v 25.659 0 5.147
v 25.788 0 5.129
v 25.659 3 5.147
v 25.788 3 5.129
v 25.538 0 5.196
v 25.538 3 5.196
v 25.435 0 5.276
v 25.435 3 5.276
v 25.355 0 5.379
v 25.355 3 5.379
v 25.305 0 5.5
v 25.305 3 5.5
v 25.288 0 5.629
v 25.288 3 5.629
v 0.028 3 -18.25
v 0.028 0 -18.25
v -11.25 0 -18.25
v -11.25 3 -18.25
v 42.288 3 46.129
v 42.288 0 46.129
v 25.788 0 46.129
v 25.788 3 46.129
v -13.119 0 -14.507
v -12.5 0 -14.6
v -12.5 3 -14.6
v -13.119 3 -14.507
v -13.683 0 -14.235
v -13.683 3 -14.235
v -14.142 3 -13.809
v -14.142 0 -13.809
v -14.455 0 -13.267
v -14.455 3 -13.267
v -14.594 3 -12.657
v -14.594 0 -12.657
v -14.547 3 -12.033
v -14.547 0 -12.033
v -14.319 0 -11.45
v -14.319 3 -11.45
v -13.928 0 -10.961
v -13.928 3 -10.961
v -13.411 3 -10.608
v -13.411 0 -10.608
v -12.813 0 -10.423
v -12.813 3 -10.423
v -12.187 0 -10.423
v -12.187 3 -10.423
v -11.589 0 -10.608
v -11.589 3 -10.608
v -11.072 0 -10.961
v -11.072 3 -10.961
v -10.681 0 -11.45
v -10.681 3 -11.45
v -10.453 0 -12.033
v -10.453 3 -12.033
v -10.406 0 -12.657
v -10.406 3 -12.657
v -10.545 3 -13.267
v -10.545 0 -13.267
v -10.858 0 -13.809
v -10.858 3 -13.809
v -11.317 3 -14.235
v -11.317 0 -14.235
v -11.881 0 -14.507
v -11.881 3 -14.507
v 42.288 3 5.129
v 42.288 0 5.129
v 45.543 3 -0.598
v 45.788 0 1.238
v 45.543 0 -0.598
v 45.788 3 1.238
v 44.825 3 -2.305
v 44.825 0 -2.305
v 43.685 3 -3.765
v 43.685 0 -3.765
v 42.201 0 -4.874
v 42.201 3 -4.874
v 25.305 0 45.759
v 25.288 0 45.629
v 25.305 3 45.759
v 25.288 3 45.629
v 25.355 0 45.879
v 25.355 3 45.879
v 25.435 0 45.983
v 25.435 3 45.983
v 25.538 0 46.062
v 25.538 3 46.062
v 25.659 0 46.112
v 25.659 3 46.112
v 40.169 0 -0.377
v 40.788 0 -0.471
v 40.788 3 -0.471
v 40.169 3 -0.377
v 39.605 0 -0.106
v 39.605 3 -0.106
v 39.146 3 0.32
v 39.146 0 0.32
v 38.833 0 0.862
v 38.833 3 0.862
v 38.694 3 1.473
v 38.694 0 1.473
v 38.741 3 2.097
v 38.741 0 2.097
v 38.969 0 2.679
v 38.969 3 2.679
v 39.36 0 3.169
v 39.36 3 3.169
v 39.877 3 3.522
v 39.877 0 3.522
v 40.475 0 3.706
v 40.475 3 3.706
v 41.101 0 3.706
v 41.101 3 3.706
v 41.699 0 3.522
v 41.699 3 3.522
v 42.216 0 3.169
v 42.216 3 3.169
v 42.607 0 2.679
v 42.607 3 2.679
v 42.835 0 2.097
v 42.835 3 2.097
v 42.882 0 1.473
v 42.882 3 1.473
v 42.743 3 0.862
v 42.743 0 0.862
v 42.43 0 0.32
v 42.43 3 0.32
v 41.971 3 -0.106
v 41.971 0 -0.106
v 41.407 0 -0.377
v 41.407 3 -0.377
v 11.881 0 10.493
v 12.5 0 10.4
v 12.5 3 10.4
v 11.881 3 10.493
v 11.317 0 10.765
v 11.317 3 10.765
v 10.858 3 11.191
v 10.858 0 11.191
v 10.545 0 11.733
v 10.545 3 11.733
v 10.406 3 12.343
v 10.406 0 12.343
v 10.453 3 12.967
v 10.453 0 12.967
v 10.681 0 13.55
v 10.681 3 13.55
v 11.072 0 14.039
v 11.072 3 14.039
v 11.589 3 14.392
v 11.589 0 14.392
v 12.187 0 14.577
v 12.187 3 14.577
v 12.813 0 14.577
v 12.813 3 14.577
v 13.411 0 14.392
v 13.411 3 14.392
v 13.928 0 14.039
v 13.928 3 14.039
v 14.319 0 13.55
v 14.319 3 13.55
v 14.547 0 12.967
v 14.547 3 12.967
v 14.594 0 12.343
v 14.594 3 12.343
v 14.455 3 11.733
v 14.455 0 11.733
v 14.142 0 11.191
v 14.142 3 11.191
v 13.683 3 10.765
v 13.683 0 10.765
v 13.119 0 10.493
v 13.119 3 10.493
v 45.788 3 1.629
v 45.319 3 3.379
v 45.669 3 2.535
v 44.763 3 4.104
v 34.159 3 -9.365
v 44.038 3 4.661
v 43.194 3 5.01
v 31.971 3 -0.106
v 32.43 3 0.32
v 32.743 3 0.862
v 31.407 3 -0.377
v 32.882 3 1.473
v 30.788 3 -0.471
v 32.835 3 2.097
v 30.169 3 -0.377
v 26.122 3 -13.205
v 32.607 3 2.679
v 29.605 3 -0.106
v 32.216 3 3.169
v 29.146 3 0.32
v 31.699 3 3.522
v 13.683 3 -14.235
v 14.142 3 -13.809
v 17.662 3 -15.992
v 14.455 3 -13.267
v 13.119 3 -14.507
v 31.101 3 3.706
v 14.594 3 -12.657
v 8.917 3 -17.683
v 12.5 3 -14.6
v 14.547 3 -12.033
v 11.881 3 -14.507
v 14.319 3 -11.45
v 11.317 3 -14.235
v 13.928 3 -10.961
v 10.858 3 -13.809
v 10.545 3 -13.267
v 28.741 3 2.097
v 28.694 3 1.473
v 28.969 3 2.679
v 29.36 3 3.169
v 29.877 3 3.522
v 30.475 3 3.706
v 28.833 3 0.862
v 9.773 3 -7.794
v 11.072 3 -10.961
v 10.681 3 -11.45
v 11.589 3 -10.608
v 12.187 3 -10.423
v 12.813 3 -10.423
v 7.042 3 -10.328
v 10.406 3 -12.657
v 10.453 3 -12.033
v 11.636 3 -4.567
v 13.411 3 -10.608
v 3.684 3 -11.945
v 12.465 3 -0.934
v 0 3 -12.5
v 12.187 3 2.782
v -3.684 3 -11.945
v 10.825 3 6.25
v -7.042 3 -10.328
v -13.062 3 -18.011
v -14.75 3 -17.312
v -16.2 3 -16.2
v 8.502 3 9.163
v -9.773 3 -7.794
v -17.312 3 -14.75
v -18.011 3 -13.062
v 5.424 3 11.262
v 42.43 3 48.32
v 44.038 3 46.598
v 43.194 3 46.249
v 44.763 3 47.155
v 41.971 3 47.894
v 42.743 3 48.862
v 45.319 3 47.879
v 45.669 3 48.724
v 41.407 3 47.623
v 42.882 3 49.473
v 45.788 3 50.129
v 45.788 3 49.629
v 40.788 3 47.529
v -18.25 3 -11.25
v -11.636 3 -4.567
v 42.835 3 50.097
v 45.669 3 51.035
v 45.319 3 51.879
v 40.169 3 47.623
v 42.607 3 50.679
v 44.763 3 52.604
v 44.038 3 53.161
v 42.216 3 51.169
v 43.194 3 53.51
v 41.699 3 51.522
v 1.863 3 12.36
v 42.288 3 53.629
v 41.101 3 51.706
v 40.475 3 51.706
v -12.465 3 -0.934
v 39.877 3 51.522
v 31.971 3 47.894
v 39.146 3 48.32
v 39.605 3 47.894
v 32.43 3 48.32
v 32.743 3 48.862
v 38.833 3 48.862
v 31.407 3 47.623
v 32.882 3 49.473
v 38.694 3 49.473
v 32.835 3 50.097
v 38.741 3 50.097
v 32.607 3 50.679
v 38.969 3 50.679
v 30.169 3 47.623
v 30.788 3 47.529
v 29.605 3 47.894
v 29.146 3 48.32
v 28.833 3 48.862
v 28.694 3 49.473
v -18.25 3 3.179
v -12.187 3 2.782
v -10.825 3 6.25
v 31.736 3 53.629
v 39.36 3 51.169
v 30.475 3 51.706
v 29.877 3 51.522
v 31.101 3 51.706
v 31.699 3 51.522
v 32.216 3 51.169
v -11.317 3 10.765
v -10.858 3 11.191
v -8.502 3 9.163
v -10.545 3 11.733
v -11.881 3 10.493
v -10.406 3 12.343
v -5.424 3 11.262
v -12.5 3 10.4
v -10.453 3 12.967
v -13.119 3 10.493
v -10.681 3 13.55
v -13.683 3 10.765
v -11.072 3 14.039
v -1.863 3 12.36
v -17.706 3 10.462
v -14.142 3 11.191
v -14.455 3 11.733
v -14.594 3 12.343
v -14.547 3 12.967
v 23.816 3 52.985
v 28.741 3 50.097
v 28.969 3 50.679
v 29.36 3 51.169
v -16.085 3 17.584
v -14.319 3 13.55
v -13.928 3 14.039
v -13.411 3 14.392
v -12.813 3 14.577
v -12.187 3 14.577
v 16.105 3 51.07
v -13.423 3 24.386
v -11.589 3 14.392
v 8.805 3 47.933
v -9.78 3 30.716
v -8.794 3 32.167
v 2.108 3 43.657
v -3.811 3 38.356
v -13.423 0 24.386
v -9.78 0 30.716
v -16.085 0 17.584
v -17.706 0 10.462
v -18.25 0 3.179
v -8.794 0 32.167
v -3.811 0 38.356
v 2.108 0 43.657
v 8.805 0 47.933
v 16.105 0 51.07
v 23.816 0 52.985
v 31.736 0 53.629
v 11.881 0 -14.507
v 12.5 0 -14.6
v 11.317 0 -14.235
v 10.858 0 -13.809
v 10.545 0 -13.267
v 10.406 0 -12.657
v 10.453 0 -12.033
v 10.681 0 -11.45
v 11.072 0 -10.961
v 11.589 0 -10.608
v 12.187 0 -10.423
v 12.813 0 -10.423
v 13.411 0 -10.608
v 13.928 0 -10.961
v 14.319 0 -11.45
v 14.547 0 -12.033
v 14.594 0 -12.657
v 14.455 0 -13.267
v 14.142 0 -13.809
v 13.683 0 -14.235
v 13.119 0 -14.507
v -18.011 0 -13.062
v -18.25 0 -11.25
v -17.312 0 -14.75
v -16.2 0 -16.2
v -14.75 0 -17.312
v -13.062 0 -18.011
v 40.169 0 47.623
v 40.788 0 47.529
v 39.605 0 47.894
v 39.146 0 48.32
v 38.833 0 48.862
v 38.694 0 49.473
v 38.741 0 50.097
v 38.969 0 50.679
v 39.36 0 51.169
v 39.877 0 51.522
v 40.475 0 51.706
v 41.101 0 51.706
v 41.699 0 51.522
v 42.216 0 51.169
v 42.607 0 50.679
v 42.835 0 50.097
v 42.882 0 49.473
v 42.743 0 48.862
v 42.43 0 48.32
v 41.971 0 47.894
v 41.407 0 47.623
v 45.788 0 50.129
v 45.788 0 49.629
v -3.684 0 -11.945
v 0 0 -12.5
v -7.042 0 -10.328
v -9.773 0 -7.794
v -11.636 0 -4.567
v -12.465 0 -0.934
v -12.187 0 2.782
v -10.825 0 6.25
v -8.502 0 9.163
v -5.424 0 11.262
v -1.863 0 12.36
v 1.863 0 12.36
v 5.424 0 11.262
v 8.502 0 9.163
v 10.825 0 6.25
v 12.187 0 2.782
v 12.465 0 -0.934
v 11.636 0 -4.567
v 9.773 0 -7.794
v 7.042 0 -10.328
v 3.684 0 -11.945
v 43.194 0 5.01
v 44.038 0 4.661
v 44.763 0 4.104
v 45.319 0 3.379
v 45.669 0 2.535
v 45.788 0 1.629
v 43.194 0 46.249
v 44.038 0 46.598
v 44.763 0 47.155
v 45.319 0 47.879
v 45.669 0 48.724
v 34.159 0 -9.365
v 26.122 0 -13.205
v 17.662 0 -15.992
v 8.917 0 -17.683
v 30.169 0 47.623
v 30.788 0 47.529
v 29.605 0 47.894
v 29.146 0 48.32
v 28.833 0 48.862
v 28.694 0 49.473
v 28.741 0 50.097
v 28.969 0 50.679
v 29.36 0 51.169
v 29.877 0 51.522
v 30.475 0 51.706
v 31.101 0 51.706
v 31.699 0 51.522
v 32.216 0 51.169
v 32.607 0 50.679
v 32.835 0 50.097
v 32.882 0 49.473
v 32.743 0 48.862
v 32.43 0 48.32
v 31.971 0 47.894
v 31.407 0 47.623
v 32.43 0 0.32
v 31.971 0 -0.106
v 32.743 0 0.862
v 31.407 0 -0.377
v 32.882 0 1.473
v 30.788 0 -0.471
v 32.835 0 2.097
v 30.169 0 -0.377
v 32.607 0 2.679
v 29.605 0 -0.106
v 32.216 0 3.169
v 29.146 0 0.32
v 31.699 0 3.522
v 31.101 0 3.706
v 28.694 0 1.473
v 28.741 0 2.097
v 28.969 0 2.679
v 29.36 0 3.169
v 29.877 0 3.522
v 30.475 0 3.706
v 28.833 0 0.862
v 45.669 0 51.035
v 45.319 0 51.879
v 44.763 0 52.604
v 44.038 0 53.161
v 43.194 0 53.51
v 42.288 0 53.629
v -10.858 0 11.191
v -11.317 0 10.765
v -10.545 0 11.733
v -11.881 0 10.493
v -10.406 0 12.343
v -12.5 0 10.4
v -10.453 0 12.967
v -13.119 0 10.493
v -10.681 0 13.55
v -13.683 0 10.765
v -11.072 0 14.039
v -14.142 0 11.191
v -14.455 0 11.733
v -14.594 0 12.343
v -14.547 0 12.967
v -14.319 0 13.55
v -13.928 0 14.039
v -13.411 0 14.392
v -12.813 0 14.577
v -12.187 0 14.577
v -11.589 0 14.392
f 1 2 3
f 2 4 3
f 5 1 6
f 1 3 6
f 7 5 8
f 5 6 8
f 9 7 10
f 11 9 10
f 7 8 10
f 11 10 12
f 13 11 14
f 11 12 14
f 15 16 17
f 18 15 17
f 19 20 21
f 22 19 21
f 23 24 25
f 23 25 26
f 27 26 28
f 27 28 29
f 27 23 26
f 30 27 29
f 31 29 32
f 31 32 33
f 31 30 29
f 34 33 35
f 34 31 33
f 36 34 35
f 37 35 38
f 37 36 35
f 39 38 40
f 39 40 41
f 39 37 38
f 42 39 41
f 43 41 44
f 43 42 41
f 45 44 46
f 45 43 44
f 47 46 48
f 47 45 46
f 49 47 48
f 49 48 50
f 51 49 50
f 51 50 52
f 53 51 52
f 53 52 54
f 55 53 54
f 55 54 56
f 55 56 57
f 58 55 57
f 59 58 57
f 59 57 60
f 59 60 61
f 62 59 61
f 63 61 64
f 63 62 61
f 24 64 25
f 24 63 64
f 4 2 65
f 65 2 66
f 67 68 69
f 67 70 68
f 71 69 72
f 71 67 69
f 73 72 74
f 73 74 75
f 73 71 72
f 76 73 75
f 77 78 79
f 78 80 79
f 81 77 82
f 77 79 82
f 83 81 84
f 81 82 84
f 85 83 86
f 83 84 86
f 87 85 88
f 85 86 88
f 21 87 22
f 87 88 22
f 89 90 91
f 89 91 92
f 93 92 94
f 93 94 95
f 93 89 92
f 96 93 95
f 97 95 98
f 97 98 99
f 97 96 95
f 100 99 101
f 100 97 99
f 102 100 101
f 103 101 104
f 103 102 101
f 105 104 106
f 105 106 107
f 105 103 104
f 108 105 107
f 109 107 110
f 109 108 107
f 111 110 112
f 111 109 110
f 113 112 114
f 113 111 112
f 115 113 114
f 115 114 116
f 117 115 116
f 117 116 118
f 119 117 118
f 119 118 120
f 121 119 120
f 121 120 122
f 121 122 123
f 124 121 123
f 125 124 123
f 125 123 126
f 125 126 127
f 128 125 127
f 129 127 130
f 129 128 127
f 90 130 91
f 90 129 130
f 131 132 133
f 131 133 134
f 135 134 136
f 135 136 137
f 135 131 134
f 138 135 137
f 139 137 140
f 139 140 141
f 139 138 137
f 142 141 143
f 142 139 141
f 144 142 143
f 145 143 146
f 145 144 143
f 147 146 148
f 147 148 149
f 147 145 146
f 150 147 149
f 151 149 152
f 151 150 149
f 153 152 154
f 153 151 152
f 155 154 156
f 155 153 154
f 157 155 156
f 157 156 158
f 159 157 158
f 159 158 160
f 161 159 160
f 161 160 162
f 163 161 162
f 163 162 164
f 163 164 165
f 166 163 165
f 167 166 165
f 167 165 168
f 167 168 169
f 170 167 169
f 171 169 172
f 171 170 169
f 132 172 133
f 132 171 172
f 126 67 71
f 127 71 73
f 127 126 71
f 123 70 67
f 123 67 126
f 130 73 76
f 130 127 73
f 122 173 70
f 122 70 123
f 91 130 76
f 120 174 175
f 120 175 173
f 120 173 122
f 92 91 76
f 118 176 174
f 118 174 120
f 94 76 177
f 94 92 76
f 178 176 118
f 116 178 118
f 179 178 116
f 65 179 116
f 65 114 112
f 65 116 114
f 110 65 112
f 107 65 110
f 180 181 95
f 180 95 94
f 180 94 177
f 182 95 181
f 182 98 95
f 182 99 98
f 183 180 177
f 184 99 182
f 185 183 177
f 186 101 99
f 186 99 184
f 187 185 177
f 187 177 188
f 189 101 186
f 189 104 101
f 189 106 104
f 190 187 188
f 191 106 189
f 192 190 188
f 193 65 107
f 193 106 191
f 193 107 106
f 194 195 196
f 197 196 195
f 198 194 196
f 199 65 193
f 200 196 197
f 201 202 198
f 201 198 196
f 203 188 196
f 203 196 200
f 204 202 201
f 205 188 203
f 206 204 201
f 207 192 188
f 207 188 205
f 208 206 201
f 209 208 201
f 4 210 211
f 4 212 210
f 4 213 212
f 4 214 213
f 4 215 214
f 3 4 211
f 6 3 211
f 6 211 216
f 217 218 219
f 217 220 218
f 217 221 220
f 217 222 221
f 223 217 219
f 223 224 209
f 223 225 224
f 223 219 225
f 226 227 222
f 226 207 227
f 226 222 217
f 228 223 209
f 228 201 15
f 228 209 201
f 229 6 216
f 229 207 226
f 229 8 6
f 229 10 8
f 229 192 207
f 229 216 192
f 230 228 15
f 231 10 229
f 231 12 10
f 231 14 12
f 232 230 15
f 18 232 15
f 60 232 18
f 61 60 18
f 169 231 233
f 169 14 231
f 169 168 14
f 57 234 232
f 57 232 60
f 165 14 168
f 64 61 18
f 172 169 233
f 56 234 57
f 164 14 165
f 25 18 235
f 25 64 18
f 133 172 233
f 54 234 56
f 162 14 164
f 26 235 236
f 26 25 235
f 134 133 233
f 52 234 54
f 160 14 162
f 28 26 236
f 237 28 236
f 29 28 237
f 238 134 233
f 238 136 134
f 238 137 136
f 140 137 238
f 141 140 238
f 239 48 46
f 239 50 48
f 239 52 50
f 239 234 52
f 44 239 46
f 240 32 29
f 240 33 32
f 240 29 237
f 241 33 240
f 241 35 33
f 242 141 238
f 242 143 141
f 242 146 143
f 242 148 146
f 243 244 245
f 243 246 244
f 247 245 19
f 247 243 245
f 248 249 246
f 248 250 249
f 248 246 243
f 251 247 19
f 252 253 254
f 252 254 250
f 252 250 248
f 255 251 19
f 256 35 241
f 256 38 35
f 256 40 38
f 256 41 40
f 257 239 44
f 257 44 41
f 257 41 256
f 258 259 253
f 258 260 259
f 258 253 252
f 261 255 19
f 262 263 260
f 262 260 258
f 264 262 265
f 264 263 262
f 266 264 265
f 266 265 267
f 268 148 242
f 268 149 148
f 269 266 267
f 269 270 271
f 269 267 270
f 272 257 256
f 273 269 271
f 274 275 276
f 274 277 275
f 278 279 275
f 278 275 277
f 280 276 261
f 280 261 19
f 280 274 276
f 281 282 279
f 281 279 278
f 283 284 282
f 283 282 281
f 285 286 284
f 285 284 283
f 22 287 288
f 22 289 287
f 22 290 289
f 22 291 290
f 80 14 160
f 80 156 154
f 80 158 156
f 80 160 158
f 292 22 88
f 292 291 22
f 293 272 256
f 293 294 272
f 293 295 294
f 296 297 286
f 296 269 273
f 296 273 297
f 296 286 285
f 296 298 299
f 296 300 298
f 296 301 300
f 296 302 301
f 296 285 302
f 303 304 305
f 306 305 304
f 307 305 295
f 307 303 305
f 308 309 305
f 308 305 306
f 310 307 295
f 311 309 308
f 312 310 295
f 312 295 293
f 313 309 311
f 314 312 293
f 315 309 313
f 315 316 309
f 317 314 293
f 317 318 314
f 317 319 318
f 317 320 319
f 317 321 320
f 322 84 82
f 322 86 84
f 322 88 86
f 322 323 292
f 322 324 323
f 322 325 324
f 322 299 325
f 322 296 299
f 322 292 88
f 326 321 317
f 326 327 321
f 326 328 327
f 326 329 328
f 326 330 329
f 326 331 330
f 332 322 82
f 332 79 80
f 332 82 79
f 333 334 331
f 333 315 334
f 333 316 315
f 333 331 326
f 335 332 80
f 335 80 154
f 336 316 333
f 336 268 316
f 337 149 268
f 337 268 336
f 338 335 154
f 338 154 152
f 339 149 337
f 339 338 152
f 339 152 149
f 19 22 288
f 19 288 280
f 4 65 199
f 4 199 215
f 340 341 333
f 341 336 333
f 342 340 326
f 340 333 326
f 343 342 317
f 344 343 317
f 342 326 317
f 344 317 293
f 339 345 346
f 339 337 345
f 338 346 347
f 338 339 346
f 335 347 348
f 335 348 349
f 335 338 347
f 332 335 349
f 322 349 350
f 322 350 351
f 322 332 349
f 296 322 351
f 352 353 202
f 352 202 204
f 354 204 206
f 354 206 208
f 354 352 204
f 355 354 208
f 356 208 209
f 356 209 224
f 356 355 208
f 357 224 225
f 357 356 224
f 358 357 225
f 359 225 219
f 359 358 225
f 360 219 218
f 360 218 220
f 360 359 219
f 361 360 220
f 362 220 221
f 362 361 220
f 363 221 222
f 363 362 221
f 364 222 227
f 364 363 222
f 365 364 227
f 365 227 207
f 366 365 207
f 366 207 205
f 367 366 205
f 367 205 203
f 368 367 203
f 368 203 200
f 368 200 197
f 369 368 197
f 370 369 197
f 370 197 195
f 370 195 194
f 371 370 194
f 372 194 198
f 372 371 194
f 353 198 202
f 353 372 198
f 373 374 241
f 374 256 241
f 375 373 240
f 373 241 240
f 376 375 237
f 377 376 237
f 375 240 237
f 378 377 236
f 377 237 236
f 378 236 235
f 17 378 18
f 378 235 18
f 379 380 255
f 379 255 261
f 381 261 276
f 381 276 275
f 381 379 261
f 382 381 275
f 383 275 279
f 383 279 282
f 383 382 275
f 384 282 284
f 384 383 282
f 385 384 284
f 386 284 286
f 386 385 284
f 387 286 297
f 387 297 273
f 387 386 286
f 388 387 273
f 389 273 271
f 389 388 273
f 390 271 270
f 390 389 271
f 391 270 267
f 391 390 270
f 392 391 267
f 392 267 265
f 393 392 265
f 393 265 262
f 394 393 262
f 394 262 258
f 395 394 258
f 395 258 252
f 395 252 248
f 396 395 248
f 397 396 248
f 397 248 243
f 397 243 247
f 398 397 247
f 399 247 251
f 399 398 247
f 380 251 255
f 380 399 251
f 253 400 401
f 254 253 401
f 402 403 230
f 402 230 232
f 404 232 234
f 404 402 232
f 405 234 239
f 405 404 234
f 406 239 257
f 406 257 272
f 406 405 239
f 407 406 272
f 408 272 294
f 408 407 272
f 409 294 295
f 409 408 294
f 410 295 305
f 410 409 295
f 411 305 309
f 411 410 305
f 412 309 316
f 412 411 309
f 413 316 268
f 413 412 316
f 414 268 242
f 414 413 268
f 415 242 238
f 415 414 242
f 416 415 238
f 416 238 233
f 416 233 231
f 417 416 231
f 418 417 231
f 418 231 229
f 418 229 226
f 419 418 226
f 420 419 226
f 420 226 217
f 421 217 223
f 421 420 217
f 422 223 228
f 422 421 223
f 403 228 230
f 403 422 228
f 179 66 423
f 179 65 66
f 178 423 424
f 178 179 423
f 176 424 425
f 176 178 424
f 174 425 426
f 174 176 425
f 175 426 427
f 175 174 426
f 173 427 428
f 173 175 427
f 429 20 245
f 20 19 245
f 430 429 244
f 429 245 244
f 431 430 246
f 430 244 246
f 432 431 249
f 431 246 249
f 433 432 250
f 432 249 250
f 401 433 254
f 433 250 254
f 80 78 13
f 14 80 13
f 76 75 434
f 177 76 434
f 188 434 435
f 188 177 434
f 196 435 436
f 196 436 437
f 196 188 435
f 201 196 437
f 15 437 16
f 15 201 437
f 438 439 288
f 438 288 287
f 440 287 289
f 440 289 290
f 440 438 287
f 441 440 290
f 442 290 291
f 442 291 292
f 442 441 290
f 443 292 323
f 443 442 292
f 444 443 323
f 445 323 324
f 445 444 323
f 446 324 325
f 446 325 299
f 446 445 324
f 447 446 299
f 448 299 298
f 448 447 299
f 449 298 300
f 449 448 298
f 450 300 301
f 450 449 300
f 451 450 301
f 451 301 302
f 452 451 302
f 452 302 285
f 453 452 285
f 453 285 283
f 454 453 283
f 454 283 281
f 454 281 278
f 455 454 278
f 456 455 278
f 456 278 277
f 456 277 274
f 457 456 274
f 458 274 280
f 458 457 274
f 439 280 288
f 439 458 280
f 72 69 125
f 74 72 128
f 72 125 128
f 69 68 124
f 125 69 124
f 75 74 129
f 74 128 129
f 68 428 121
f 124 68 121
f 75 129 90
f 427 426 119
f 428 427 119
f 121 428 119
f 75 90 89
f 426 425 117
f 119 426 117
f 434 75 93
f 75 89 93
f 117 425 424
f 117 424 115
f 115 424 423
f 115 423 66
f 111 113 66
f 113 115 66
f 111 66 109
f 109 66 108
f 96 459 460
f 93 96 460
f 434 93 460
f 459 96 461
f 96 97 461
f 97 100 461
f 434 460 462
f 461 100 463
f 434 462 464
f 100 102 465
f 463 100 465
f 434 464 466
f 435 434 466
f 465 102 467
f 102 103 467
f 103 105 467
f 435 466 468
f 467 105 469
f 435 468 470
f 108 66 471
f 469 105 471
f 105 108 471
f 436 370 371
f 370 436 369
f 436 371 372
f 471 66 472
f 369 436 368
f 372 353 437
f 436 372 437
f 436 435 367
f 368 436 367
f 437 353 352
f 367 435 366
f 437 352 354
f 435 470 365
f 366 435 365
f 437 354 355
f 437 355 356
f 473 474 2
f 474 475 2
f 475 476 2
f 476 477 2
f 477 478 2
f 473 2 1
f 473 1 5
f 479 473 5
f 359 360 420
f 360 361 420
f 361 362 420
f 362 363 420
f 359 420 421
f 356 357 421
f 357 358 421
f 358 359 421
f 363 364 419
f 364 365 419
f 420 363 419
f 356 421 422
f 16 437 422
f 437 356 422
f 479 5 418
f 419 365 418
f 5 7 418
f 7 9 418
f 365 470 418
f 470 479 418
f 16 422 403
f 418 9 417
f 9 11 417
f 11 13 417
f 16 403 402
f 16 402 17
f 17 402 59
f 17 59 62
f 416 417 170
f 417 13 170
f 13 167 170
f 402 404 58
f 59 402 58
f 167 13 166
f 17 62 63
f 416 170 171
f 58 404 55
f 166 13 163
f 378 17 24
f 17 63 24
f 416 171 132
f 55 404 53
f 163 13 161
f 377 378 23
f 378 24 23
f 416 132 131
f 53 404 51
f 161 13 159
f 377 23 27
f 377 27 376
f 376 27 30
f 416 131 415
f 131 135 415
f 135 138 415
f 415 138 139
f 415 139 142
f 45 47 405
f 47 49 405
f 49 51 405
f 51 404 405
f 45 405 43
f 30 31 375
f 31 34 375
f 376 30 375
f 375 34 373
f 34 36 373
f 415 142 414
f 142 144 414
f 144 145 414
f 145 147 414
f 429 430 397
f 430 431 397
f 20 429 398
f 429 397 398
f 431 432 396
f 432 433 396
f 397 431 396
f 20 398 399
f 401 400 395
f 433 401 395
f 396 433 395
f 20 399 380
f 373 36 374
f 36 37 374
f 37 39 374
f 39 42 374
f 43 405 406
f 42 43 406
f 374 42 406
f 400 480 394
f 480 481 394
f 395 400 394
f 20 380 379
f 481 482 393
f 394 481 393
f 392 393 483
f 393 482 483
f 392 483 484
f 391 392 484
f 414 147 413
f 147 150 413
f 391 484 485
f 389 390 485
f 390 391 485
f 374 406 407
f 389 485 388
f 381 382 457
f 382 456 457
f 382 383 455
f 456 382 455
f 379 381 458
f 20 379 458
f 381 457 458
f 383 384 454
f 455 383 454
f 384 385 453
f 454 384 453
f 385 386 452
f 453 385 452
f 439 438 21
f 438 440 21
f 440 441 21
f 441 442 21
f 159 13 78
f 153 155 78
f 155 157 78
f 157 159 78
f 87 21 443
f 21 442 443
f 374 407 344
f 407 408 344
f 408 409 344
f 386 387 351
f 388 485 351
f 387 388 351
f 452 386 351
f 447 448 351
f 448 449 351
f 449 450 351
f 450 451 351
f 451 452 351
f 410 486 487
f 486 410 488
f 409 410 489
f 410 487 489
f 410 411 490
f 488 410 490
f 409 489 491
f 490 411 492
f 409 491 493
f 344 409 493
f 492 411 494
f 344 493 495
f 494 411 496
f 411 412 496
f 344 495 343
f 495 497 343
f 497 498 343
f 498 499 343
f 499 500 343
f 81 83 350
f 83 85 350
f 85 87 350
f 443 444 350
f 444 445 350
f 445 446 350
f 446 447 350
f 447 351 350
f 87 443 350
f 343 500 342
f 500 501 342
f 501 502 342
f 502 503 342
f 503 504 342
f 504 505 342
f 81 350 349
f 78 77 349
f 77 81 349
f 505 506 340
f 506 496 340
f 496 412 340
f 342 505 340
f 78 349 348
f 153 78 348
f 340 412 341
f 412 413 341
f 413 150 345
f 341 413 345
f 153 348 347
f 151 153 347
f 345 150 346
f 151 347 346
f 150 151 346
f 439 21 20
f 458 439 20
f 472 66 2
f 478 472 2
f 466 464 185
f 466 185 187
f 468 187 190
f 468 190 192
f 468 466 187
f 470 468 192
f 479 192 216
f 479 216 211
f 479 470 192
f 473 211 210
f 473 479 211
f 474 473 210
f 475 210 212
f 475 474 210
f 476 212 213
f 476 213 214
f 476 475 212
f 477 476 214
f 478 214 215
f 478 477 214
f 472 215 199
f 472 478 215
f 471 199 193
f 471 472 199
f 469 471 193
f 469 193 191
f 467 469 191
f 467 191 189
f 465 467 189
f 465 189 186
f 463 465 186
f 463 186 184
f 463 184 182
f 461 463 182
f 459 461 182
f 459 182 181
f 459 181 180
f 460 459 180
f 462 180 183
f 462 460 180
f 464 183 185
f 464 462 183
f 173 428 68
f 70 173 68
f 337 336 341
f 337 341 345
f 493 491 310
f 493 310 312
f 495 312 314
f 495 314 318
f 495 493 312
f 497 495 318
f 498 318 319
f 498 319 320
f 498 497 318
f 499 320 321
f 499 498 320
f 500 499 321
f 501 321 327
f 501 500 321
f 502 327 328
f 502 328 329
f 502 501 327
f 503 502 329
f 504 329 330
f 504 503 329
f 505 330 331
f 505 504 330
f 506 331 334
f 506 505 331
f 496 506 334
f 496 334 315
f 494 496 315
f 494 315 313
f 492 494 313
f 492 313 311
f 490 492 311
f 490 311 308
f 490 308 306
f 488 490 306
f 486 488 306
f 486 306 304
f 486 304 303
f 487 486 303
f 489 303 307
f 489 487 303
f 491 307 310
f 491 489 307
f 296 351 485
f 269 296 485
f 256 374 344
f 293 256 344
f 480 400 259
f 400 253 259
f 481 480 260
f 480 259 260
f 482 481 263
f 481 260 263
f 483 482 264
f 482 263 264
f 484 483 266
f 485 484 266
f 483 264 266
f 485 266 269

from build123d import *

# Parameters (mm, degrees)
SZKIC1_R                   = 2.1
SZKIC1_R_2                 = 12.5
WYCI_GNI_CIE_PROSTE1_DEPTH = 3
ZAOKR_GLENIE1_R            = 0.5
ZAOKR_GLENIE3_R            = 3.5
ZAOKR_GLENIE4_R            = 7
ZAOKR_GLENIE5_R            = 70
ZAOKR_GLENIE6_R            = 49
ZAOKR_GLENIE7_R            = 49
ZAOKR_GLENIE8_R            = 7


with BuildPart() as part:
    # Szkic1 → Wyciągnięcie proste1 (new body)
    with BuildSketch(Plane(origin=(0, 0, 0), x_dir=(-1, 0, 0), z_dir=(0, 1, 0))):
        Polygon((-18.25, -18.25), (18.25, -18.25), (18.25, 18.25), (-5.78812344, 53.629485271), (-35.78812344, 53.629485271), (-45.78812344, 53.629485271), (-45.78812344, 46.129485271), (-25.28812344, 46.129485271), (-25.28812344, 5.129485271), (-45.78812344, 5.129485271), (-45.78812344, -2.870514729), align=None)
        with Locations(Location((-40.78812344, 1.629485271, 0), (0, 0, 270))):
            Circle(SZKIC1_R, mode=Mode.SUBTRACT)
        with Locations(Location((-12.5, 12.5, 0), (0, 0, 270))):
            Circle(SZKIC1_R, mode=Mode.SUBTRACT)
        with Locations(Location((-30.78812344, 49.629485271, 0), (0, 0, 270))):
            Circle(SZKIC1_R, mode=Mode.SUBTRACT)
        with Locations(Location((-40.78812344, 49.629485271, 0), (0, 0, 270))):
            Circle(SZKIC1_R, mode=Mode.SUBTRACT)
        with Locations(Location((12.5, 12.5, 0), (0, 0, 270))):
            Circle(SZKIC1_R, mode=Mode.SUBTRACT)
        with Locations(Location((-30.78812344, 1.629485271, 0), (0, 0, 270))):
            Circle(SZKIC1_R, mode=Mode.SUBTRACT)
        with Locations(Location((12.5, -12.5, 0), (0, 0, 270))):
            Circle(SZKIC1_R, mode=Mode.SUBTRACT)
        with Locations(Location((-12.5, -12.5, 0), (0, 0, 270))):
            Circle(SZKIC1_R, mode=Mode.SUBTRACT)
        with Locations(Location((0, 0, 0), (0, 0, 270))):
            Circle(SZKIC1_R_2, mode=Mode.SUBTRACT)
    extrude(amount=WYCI_GNI_CIE_PROSTE1_DEPTH)

    # Zaokrąglenie1
    zaokr_glenie1_edges = [part.edges().sort_by_distance(p)[0] for p in [
        (25.28812344, 1.5, 5.129485271),
        (25.28812344, 1.5, 46.129485271),
    ]]
    fillet(zaokr_glenie1_edges, radius=ZAOKR_GLENIE1_R)

    # Zaokrąglenie3
    zaokr_glenie3_edges = [part.edges().sort_by_distance(p)[0] for p in [
        (45.78812344, 1.5, 5.129485271),
        (45.78812344, 1.5, 46.129485271),
        (45.78812344, 1.5, 53.629485271),
    ]]
    fillet(zaokr_glenie3_edges, radius=ZAOKR_GLENIE3_R)

    # Zaokrąglenie4
    zaokr_glenie4_edges = [part.edges().sort_by_distance(p)[0] for p in [
        (45.78812344, 1.5, -2.870514729),
    ]]
    fillet(zaokr_glenie4_edges, radius=ZAOKR_GLENIE4_R)

    # Zaokrąglenie5
    zaokr_glenie5_edges = [part.edges().sort_by_distance(p)[0] for p in [
        (18.25, 1.5, -18.25),
    ]]
    fillet(zaokr_glenie5_edges, radius=ZAOKR_GLENIE5_R)

    # Zaokrąglenie6
    zaokr_glenie6_edges = [part.edges().sort_by_distance(p)[0] for p in [
        (5.78812344, 1.5, 53.629485271),
    ]]
    fillet(zaokr_glenie6_edges, radius=ZAOKR_GLENIE6_R)

    # Zaokrąglenie7
    zaokr_glenie7_edges = [part.edges().sort_by_distance(p)[0] for p in [
        (-18.25, 1.5, 18.25),
    ]]
    fillet(zaokr_glenie7_edges, radius=ZAOKR_GLENIE7_R)

    # Zaokrąglenie8
    zaokr_glenie8_edges = [part.edges().sort_by_distance(p)[0] for p in [
        (-18.25, 1.5, -18.25),
    ]]
    fillet(zaokr_glenie8_edges, radius=ZAOKR_GLENIE8_R)


solid = part.part
